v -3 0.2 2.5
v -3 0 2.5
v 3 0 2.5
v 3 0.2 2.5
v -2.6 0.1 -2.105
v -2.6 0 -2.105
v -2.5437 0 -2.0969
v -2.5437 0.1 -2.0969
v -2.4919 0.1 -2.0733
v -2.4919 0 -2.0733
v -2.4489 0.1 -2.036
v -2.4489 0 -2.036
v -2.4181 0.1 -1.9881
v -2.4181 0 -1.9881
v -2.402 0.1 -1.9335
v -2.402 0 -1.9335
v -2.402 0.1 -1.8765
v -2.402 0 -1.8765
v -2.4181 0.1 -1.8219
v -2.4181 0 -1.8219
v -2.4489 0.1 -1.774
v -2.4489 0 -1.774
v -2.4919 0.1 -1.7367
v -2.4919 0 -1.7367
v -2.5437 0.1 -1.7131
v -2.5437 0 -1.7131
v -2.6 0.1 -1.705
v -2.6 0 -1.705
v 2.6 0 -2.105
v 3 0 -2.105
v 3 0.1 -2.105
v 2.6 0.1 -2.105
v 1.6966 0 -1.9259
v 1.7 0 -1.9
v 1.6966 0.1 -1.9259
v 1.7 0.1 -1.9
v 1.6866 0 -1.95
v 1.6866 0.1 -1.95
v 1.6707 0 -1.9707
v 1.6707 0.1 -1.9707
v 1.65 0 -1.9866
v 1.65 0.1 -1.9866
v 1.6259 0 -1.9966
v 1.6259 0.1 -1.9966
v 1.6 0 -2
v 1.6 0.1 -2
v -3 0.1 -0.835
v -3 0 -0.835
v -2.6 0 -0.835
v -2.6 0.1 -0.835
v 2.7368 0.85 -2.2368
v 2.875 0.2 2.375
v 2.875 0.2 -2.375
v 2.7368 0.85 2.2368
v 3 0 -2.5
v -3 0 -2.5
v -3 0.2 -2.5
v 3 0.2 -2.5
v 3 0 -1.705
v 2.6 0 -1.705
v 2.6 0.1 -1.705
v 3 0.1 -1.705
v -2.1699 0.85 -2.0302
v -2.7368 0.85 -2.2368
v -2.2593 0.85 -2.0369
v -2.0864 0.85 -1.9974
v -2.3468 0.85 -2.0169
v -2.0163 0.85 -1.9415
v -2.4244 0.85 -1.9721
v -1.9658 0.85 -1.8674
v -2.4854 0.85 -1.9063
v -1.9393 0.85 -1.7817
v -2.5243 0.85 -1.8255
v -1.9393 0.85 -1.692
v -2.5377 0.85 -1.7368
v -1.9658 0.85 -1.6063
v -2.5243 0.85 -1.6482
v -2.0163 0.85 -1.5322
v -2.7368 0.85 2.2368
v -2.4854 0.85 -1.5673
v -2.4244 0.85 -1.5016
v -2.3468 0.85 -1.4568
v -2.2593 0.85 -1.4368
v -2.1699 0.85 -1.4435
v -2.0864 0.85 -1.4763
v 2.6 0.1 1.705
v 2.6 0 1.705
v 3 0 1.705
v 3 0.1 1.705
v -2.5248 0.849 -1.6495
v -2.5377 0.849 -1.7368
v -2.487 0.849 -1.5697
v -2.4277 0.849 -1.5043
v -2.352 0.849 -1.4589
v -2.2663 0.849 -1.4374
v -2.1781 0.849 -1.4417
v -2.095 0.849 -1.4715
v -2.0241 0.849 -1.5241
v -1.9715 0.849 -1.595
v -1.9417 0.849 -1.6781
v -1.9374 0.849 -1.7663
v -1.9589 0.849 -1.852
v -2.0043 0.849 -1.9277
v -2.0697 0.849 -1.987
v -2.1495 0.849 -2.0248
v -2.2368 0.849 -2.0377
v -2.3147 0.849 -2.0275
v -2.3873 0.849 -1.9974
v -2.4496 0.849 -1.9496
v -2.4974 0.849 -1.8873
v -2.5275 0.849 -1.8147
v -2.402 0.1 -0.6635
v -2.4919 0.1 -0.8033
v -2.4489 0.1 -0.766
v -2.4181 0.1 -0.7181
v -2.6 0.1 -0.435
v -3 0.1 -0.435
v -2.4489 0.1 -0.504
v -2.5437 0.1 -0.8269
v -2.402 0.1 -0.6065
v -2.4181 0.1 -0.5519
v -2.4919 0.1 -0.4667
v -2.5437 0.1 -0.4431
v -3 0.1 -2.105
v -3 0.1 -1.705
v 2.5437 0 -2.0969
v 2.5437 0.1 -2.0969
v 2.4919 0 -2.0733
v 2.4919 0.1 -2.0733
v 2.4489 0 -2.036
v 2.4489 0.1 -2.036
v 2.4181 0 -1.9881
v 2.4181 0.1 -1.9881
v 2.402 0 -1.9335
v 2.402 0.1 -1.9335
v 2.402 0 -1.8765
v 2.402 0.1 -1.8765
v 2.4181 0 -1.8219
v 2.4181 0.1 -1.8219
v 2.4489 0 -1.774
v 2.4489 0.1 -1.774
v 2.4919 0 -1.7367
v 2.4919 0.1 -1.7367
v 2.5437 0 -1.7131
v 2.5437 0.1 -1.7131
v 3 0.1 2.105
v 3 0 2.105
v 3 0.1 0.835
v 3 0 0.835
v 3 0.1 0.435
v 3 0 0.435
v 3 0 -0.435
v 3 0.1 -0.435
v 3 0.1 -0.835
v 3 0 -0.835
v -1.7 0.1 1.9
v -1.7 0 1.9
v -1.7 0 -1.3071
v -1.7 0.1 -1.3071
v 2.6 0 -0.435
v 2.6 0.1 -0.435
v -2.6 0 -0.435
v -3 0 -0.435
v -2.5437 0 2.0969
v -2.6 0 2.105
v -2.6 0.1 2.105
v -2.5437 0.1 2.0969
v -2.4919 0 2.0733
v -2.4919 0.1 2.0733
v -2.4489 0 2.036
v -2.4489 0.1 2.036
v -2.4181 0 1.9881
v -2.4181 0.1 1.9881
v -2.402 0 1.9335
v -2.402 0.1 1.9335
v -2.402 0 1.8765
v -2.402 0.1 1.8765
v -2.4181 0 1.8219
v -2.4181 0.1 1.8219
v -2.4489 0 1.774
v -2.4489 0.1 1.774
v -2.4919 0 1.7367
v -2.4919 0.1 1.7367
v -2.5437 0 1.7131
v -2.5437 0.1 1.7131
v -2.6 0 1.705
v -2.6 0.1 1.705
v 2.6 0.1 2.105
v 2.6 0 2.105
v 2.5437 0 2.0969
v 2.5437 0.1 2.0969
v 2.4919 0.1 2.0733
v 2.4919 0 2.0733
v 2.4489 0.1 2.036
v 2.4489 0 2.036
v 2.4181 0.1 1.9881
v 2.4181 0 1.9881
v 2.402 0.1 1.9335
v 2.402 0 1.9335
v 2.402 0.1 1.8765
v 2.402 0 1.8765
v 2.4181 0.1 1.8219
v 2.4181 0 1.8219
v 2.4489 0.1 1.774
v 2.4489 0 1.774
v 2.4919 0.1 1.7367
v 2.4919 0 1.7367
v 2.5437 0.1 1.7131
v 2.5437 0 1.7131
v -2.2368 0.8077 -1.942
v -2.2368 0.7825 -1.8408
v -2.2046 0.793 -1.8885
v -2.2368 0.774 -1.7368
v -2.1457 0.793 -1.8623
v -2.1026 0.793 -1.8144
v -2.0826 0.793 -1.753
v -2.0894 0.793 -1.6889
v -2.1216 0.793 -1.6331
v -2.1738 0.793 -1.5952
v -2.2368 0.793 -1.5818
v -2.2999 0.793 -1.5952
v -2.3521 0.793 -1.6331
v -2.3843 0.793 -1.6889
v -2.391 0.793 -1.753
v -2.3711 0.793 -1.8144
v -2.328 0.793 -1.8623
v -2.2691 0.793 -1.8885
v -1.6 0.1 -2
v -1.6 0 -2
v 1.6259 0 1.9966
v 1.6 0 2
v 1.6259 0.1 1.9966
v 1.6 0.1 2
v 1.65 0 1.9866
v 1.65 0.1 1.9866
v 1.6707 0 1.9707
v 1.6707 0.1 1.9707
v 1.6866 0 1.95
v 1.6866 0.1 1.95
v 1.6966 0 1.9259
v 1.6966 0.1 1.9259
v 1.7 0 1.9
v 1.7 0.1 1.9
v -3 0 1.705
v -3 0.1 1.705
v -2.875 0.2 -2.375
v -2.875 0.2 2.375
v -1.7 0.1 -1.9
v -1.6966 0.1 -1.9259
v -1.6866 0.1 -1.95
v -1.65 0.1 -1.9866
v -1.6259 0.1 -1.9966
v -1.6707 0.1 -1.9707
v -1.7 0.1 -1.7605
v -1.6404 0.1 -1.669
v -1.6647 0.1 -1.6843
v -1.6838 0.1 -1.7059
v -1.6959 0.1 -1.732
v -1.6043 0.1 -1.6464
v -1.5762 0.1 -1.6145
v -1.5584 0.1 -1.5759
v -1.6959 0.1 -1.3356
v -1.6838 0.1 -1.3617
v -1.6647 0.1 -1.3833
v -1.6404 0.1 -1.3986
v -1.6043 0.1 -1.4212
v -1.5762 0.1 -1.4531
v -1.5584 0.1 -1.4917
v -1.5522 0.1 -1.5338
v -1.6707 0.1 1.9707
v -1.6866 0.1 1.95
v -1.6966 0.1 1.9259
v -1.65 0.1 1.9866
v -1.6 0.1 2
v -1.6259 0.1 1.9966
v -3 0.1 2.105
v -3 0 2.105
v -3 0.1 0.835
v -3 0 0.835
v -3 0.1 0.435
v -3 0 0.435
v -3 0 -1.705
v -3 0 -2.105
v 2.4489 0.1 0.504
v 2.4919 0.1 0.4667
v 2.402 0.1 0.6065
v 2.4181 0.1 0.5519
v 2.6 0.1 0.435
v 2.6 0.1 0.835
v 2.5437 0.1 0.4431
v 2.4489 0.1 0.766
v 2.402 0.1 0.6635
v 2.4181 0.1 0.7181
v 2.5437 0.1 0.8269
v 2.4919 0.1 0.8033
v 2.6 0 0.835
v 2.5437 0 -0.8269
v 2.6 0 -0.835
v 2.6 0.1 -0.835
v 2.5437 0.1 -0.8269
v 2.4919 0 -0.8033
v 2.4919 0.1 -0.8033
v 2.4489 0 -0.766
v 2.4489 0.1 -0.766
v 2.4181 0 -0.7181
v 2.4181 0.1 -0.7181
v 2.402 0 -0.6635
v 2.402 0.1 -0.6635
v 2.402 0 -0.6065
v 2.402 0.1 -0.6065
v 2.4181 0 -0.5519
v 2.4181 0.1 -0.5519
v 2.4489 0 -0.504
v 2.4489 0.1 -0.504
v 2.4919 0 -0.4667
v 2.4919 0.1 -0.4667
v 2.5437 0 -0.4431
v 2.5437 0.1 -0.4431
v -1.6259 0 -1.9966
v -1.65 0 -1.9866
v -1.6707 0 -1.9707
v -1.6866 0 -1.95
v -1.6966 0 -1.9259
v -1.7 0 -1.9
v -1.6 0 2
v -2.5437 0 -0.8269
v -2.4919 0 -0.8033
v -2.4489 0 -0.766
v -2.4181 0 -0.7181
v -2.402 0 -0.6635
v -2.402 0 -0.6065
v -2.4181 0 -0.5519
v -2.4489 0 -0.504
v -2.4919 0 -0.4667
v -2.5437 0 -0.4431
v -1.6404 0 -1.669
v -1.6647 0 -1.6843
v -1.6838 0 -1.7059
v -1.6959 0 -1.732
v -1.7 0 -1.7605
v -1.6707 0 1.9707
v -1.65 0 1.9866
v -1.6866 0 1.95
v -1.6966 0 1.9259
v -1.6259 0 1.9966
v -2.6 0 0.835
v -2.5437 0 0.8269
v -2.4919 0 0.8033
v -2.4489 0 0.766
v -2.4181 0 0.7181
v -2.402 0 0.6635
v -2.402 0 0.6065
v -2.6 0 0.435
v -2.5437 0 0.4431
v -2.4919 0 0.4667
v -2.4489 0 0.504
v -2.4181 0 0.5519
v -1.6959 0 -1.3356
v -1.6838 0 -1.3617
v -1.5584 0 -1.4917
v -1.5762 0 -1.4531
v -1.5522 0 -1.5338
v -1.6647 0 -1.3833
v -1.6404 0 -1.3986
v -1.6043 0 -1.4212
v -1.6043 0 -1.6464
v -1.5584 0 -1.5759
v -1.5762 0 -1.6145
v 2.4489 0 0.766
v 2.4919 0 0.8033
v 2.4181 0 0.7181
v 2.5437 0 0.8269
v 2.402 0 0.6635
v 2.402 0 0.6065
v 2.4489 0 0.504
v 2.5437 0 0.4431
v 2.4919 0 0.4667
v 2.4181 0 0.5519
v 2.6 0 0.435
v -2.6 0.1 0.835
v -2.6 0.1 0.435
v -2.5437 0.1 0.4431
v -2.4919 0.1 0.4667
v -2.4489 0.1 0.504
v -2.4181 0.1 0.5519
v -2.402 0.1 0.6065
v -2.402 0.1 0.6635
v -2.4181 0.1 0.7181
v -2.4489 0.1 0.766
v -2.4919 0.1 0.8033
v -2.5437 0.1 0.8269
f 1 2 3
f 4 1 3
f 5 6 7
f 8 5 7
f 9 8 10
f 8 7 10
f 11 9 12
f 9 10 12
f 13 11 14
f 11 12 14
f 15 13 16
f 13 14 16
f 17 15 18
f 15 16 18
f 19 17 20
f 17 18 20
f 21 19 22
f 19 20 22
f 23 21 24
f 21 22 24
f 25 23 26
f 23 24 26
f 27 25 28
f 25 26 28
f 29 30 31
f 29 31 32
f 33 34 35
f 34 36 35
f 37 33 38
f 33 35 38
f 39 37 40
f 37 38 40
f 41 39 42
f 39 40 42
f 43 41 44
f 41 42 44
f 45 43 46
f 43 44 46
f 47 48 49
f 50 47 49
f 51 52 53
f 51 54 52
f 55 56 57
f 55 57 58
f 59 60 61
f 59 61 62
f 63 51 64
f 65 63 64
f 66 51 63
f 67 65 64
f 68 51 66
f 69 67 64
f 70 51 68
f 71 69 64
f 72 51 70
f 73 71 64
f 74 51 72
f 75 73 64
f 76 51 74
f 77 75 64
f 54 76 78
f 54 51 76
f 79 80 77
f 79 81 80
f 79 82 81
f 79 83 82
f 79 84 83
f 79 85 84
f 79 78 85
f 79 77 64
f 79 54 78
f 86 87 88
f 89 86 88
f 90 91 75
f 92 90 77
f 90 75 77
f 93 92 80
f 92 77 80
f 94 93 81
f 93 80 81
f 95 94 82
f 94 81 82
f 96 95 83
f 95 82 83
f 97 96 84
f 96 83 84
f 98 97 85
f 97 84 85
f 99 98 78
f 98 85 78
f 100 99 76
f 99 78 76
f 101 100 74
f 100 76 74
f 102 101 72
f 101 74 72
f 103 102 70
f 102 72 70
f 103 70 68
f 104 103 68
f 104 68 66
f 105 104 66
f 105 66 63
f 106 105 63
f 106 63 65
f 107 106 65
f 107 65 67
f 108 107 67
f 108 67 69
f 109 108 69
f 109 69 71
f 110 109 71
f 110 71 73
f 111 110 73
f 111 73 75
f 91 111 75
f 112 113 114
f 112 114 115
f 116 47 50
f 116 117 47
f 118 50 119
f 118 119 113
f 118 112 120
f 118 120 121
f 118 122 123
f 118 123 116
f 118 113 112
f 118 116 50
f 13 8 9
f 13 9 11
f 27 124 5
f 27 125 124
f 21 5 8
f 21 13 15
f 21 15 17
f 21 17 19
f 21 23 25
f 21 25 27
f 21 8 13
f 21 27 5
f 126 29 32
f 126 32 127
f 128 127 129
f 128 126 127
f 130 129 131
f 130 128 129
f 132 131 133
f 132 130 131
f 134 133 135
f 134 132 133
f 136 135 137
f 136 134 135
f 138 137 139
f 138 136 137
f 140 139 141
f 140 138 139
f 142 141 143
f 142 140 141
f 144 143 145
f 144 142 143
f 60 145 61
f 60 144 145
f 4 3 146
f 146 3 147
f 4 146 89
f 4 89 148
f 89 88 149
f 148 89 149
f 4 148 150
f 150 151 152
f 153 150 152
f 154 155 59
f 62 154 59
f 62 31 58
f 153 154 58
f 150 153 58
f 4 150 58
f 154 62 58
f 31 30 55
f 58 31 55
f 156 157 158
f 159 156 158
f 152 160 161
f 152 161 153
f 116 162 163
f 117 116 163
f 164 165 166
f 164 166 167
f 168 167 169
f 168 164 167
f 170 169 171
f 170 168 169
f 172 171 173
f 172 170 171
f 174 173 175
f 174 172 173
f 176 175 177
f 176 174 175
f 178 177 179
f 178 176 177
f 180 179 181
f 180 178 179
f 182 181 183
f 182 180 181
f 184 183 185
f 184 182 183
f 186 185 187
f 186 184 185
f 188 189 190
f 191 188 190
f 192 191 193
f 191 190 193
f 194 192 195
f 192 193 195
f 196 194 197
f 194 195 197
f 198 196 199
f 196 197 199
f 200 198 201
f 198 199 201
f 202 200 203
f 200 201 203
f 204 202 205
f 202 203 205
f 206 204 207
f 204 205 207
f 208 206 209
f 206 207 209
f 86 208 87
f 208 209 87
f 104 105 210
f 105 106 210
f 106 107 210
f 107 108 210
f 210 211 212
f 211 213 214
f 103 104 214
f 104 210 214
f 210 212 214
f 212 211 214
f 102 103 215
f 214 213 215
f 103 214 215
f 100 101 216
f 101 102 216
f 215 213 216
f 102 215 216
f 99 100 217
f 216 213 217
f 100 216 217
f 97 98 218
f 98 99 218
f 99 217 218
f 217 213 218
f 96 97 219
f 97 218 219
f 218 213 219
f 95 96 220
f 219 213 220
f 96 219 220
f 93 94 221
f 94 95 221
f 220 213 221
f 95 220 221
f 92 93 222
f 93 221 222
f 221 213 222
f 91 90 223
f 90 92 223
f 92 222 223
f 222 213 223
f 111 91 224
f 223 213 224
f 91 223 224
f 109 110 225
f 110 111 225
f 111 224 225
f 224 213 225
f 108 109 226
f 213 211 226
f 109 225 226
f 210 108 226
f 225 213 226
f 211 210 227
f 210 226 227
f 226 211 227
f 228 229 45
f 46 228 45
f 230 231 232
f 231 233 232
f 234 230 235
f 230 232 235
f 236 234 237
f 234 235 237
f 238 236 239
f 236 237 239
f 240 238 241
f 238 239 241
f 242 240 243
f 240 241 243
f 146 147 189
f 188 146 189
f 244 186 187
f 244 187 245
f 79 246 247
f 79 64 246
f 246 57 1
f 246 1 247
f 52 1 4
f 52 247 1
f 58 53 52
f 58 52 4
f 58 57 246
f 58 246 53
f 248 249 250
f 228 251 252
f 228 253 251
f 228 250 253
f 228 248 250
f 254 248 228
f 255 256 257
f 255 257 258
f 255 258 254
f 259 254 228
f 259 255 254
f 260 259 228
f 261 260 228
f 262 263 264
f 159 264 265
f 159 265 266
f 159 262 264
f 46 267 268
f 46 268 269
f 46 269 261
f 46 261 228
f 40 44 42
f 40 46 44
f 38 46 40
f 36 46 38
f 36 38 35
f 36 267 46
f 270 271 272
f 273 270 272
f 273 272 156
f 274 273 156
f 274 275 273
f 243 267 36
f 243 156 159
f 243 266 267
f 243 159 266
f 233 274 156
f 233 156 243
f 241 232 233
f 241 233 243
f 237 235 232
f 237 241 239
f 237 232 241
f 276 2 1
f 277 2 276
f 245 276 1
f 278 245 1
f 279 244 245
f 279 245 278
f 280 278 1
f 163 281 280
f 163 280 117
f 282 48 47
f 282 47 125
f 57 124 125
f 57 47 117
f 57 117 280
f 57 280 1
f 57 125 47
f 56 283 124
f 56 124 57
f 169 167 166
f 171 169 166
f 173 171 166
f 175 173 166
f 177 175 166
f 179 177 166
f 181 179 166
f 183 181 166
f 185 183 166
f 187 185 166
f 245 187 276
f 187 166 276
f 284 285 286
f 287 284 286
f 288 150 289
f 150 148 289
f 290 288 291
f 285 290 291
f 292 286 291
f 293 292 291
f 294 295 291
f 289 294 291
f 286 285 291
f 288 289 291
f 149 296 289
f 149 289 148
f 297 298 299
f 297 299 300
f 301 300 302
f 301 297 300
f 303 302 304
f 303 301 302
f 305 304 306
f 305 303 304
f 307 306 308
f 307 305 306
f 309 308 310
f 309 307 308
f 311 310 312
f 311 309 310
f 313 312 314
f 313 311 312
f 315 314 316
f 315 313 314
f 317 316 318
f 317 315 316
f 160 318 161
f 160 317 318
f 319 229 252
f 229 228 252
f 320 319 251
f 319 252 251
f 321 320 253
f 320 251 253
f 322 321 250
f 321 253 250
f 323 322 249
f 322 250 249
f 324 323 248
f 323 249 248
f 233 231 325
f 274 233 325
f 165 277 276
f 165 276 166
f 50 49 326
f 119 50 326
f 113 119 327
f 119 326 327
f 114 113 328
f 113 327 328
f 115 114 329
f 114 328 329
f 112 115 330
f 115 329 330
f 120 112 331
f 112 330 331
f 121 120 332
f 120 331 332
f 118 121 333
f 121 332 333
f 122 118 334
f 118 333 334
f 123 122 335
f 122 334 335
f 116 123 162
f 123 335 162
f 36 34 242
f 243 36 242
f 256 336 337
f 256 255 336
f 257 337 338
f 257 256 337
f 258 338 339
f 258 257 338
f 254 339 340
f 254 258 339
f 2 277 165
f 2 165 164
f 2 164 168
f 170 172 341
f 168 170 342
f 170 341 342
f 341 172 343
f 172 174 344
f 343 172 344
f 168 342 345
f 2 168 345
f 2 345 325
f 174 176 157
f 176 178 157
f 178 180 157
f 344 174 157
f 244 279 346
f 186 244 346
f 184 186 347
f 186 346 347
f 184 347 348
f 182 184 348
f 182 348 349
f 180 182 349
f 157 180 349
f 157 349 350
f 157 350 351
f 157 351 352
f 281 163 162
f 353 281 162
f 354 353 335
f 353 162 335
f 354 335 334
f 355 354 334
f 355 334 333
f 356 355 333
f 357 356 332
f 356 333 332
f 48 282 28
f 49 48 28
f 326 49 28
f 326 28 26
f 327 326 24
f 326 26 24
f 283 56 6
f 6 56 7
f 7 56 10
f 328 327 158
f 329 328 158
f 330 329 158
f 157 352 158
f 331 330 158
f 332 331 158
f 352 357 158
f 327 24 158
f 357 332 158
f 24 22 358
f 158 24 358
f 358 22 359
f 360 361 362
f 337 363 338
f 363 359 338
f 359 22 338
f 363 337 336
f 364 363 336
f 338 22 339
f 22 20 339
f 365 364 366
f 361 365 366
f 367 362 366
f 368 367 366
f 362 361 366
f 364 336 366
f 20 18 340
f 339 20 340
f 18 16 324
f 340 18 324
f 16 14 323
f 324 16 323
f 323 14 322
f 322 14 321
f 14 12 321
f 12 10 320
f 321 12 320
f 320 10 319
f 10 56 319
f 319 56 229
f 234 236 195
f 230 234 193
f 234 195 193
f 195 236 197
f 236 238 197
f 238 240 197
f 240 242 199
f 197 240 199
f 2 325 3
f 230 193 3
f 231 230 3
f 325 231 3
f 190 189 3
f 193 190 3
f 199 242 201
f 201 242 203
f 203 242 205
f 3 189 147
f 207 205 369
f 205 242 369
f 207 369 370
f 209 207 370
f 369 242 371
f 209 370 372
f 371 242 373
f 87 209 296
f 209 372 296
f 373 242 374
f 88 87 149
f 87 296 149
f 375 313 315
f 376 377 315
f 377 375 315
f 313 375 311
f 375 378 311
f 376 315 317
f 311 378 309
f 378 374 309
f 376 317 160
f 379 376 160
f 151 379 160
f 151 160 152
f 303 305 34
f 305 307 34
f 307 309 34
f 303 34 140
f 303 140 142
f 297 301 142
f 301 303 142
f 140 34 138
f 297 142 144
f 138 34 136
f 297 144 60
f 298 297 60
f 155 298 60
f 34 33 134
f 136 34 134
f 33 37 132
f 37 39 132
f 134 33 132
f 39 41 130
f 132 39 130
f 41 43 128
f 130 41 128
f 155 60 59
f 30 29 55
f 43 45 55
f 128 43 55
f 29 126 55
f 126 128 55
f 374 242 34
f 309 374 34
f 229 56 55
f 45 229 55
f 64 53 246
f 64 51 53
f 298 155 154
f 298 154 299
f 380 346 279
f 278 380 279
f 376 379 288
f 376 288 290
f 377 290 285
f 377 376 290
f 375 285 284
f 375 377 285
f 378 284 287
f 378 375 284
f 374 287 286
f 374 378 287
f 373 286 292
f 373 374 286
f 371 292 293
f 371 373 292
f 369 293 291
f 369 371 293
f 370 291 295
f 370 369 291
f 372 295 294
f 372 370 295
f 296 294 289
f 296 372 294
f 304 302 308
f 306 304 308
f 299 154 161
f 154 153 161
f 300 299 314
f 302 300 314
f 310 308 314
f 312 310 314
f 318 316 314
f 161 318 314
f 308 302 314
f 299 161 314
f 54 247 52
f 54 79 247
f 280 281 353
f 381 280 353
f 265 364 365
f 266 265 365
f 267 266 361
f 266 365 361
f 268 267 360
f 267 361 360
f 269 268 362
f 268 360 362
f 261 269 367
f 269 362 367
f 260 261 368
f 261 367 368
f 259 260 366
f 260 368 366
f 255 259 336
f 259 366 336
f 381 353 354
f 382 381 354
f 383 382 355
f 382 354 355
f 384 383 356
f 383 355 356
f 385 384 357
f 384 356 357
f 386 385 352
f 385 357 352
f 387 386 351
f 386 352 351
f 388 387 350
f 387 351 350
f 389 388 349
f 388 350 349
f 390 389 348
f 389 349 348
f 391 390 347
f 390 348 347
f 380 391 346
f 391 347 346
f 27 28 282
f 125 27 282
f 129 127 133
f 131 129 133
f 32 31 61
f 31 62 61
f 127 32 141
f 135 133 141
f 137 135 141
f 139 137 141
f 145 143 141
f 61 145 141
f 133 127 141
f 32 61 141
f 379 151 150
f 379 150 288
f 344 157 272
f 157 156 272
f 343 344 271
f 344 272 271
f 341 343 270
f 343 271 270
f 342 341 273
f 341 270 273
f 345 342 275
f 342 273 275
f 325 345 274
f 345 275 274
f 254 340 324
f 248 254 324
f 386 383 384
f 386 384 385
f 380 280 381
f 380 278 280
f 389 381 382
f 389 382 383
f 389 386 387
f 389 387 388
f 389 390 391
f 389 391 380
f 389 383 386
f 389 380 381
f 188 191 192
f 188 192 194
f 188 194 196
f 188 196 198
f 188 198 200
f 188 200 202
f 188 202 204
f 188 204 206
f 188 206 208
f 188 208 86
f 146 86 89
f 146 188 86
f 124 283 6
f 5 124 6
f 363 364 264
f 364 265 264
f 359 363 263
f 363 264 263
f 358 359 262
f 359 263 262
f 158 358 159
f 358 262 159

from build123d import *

# Parameters (mm, degrees)
SKETCH1_W         = 6
SKETCH1_H         = 5
EXTRUDE1_DEPTH    = 0.2
SKETCH2_W         = 5.75
SKETCH2_H         = 4.75
EXTRUDE2_DEPTH    = 0.65
EXTRUDE2_TAPER    = 12
SKETCH3_R         = 0.30087537
EXTRUDE3_DEPTH    = 0.001
DOME1_FACE_RADIUS = 0.30087537
DOME1_HEIGHT      = 0.075
EXTRUDE4_DEPTH    = 0.1
FILLET1_R         = 0.1
EXTRUDE5_DEPTH    = 0.1


with BuildPart() as part:
    # Sketch1 → Extrude1 (new body)
    with BuildSketch(Plane(origin=(0, 0, 0), x_dir=(1, 0, 0), z_dir=(0, 1, 0))):
        Rectangle(SKETCH1_W, SKETCH1_H)
    extrude(amount=EXTRUDE1_DEPTH)

    # Sketch2 → Extrude2 (add)
    with BuildSketch(Plane(origin=(0, 0.2, 0), x_dir=(-1, 0, 0), z_dir=(0, 1, 0))):
        Rectangle(SKETCH2_W, SKETCH2_H)
    extrude(amount=EXTRUDE2_DEPTH, taper=EXTRUDE2_TAPER)

    # Sketch3 → Extrude3 (cut)
    with BuildSketch(Plane(origin=(0, 0.85, 0), x_dir=(-1, 0, 0), z_dir=(0, 1, 0))):
        with Locations((2.236838235, -1.736838235)):
            Circle(SKETCH3_R)
    extrude(amount=-EXTRUDE3_DEPTH, mode=Mode.SUBTRACT)

    # Dome1: a dome of height H over a round flat face of radius A is a cap of a sphere of radius (A * A + H * H) / (2 * H)
    dome1_r = (DOME1_FACE_RADIUS * DOME1_FACE_RADIUS + DOME1_HEIGHT * DOME1_HEIGHT) / (2 * DOME1_HEIGHT)
    dome1_base = Plane((-2.236838235, 0.849, -1.736838235), z_dir=(0, -1, 0))
    with Locations(dome1_base.offset(DOME1_HEIGHT - dome1_r)):
        dome1_ball = Sphere(dome1_r, mode=Mode.PRIVATE)
    add(split(dome1_ball, bisect_by=dome1_base, keep=Keep.TOP, mode=Mode.PRIVATE), mode=Mode.SUBTRACT)

    # Sketch4 → Extrude4 (cut)
    with BuildSketch(Plane.XZ):
        with BuildLine():
            Line((-1.7, -1.68154059), (-1.7, -2))
            Line((-1.7, -2), (1.7, -2))
            Line((1.7, -2), (1.7, 2))
            Line((1.7, 2), (-1.7, 2))
            Line((-1.7, 2), (-1.7, -1.386002452))
            ThreePointArc((-1.7, -1.386002452), (-1.552230931, -1.533771521), (-1.7, -1.68154059))
        make_face()
    extrude(amount=-EXTRUDE4_DEPTH, mode=Mode.SUBTRACT)

    # Fillet1
    fillet1_edges = [part.edges().sort_by_distance(p)[0] for p in [
        (1.7, 0.05, 2),
        (1.7, 0.05, -2),
        (-1.7, 0.05, -2),
        (-1.7, 0.05, -1.68154059),
        (-1.7, 0.05, -1.386002452),
        (-1.7, 0.05, 2),
    ]]
    fillet(fillet1_edges, radius=FILLET1_R)

    # Sketch5 → Extrude5 (cut)
    with BuildSketch(Plane.XZ):
        with BuildLine():
            Line((3, 2.105), (2.6, 2.105))
            ThreePointArc((2.6, 2.105), (2.4, 1.905), (2.6, 1.705))
            Line((2.6, 1.705), (3, 1.705))
            Line((3, 1.705), (3, 2.105))
        make_face()
        with BuildLine():
            Line((3, 0.435), (2.6, 0.435))
            ThreePointArc((2.6, 0.435), (2.4, 0.635), (2.6, 0.835))
            Line((2.6, 0.835), (3, 0.835))
            Line((3, 0.835), (3, 0.435))
        make_face()
        with BuildLine():
            Line((3, -0.835), (2.6, -0.835))
            ThreePointArc((2.6, -0.835), (2.4, -0.635), (2.6, -0.435))
            Line((2.6, -0.435), (3, -0.435))
            Line((3, -0.435), (3, -0.835))
        make_face()
        with BuildLine():
            Line((3, -2.105), (2.6, -2.105))
            ThreePointArc((2.6, -2.105), (2.4, -1.905), (2.6, -1.705))
            Line((2.6, -1.705), (3, -1.705))
            Line((3, -1.705), (3, -2.105))
        make_face()
    extrude5 = extrude(amount=-EXTRUDE5_DEPTH, mode=Mode.SUBTRACT)

    # Mirror1: Extrude5 across plane
    add(extrude5.mirror(Plane(origin=(0, 0, 0), x_dir=(0, 0, 1), z_dir=(1, 0, 0))), mode=Mode.SUBTRACT)


solid = part.part
